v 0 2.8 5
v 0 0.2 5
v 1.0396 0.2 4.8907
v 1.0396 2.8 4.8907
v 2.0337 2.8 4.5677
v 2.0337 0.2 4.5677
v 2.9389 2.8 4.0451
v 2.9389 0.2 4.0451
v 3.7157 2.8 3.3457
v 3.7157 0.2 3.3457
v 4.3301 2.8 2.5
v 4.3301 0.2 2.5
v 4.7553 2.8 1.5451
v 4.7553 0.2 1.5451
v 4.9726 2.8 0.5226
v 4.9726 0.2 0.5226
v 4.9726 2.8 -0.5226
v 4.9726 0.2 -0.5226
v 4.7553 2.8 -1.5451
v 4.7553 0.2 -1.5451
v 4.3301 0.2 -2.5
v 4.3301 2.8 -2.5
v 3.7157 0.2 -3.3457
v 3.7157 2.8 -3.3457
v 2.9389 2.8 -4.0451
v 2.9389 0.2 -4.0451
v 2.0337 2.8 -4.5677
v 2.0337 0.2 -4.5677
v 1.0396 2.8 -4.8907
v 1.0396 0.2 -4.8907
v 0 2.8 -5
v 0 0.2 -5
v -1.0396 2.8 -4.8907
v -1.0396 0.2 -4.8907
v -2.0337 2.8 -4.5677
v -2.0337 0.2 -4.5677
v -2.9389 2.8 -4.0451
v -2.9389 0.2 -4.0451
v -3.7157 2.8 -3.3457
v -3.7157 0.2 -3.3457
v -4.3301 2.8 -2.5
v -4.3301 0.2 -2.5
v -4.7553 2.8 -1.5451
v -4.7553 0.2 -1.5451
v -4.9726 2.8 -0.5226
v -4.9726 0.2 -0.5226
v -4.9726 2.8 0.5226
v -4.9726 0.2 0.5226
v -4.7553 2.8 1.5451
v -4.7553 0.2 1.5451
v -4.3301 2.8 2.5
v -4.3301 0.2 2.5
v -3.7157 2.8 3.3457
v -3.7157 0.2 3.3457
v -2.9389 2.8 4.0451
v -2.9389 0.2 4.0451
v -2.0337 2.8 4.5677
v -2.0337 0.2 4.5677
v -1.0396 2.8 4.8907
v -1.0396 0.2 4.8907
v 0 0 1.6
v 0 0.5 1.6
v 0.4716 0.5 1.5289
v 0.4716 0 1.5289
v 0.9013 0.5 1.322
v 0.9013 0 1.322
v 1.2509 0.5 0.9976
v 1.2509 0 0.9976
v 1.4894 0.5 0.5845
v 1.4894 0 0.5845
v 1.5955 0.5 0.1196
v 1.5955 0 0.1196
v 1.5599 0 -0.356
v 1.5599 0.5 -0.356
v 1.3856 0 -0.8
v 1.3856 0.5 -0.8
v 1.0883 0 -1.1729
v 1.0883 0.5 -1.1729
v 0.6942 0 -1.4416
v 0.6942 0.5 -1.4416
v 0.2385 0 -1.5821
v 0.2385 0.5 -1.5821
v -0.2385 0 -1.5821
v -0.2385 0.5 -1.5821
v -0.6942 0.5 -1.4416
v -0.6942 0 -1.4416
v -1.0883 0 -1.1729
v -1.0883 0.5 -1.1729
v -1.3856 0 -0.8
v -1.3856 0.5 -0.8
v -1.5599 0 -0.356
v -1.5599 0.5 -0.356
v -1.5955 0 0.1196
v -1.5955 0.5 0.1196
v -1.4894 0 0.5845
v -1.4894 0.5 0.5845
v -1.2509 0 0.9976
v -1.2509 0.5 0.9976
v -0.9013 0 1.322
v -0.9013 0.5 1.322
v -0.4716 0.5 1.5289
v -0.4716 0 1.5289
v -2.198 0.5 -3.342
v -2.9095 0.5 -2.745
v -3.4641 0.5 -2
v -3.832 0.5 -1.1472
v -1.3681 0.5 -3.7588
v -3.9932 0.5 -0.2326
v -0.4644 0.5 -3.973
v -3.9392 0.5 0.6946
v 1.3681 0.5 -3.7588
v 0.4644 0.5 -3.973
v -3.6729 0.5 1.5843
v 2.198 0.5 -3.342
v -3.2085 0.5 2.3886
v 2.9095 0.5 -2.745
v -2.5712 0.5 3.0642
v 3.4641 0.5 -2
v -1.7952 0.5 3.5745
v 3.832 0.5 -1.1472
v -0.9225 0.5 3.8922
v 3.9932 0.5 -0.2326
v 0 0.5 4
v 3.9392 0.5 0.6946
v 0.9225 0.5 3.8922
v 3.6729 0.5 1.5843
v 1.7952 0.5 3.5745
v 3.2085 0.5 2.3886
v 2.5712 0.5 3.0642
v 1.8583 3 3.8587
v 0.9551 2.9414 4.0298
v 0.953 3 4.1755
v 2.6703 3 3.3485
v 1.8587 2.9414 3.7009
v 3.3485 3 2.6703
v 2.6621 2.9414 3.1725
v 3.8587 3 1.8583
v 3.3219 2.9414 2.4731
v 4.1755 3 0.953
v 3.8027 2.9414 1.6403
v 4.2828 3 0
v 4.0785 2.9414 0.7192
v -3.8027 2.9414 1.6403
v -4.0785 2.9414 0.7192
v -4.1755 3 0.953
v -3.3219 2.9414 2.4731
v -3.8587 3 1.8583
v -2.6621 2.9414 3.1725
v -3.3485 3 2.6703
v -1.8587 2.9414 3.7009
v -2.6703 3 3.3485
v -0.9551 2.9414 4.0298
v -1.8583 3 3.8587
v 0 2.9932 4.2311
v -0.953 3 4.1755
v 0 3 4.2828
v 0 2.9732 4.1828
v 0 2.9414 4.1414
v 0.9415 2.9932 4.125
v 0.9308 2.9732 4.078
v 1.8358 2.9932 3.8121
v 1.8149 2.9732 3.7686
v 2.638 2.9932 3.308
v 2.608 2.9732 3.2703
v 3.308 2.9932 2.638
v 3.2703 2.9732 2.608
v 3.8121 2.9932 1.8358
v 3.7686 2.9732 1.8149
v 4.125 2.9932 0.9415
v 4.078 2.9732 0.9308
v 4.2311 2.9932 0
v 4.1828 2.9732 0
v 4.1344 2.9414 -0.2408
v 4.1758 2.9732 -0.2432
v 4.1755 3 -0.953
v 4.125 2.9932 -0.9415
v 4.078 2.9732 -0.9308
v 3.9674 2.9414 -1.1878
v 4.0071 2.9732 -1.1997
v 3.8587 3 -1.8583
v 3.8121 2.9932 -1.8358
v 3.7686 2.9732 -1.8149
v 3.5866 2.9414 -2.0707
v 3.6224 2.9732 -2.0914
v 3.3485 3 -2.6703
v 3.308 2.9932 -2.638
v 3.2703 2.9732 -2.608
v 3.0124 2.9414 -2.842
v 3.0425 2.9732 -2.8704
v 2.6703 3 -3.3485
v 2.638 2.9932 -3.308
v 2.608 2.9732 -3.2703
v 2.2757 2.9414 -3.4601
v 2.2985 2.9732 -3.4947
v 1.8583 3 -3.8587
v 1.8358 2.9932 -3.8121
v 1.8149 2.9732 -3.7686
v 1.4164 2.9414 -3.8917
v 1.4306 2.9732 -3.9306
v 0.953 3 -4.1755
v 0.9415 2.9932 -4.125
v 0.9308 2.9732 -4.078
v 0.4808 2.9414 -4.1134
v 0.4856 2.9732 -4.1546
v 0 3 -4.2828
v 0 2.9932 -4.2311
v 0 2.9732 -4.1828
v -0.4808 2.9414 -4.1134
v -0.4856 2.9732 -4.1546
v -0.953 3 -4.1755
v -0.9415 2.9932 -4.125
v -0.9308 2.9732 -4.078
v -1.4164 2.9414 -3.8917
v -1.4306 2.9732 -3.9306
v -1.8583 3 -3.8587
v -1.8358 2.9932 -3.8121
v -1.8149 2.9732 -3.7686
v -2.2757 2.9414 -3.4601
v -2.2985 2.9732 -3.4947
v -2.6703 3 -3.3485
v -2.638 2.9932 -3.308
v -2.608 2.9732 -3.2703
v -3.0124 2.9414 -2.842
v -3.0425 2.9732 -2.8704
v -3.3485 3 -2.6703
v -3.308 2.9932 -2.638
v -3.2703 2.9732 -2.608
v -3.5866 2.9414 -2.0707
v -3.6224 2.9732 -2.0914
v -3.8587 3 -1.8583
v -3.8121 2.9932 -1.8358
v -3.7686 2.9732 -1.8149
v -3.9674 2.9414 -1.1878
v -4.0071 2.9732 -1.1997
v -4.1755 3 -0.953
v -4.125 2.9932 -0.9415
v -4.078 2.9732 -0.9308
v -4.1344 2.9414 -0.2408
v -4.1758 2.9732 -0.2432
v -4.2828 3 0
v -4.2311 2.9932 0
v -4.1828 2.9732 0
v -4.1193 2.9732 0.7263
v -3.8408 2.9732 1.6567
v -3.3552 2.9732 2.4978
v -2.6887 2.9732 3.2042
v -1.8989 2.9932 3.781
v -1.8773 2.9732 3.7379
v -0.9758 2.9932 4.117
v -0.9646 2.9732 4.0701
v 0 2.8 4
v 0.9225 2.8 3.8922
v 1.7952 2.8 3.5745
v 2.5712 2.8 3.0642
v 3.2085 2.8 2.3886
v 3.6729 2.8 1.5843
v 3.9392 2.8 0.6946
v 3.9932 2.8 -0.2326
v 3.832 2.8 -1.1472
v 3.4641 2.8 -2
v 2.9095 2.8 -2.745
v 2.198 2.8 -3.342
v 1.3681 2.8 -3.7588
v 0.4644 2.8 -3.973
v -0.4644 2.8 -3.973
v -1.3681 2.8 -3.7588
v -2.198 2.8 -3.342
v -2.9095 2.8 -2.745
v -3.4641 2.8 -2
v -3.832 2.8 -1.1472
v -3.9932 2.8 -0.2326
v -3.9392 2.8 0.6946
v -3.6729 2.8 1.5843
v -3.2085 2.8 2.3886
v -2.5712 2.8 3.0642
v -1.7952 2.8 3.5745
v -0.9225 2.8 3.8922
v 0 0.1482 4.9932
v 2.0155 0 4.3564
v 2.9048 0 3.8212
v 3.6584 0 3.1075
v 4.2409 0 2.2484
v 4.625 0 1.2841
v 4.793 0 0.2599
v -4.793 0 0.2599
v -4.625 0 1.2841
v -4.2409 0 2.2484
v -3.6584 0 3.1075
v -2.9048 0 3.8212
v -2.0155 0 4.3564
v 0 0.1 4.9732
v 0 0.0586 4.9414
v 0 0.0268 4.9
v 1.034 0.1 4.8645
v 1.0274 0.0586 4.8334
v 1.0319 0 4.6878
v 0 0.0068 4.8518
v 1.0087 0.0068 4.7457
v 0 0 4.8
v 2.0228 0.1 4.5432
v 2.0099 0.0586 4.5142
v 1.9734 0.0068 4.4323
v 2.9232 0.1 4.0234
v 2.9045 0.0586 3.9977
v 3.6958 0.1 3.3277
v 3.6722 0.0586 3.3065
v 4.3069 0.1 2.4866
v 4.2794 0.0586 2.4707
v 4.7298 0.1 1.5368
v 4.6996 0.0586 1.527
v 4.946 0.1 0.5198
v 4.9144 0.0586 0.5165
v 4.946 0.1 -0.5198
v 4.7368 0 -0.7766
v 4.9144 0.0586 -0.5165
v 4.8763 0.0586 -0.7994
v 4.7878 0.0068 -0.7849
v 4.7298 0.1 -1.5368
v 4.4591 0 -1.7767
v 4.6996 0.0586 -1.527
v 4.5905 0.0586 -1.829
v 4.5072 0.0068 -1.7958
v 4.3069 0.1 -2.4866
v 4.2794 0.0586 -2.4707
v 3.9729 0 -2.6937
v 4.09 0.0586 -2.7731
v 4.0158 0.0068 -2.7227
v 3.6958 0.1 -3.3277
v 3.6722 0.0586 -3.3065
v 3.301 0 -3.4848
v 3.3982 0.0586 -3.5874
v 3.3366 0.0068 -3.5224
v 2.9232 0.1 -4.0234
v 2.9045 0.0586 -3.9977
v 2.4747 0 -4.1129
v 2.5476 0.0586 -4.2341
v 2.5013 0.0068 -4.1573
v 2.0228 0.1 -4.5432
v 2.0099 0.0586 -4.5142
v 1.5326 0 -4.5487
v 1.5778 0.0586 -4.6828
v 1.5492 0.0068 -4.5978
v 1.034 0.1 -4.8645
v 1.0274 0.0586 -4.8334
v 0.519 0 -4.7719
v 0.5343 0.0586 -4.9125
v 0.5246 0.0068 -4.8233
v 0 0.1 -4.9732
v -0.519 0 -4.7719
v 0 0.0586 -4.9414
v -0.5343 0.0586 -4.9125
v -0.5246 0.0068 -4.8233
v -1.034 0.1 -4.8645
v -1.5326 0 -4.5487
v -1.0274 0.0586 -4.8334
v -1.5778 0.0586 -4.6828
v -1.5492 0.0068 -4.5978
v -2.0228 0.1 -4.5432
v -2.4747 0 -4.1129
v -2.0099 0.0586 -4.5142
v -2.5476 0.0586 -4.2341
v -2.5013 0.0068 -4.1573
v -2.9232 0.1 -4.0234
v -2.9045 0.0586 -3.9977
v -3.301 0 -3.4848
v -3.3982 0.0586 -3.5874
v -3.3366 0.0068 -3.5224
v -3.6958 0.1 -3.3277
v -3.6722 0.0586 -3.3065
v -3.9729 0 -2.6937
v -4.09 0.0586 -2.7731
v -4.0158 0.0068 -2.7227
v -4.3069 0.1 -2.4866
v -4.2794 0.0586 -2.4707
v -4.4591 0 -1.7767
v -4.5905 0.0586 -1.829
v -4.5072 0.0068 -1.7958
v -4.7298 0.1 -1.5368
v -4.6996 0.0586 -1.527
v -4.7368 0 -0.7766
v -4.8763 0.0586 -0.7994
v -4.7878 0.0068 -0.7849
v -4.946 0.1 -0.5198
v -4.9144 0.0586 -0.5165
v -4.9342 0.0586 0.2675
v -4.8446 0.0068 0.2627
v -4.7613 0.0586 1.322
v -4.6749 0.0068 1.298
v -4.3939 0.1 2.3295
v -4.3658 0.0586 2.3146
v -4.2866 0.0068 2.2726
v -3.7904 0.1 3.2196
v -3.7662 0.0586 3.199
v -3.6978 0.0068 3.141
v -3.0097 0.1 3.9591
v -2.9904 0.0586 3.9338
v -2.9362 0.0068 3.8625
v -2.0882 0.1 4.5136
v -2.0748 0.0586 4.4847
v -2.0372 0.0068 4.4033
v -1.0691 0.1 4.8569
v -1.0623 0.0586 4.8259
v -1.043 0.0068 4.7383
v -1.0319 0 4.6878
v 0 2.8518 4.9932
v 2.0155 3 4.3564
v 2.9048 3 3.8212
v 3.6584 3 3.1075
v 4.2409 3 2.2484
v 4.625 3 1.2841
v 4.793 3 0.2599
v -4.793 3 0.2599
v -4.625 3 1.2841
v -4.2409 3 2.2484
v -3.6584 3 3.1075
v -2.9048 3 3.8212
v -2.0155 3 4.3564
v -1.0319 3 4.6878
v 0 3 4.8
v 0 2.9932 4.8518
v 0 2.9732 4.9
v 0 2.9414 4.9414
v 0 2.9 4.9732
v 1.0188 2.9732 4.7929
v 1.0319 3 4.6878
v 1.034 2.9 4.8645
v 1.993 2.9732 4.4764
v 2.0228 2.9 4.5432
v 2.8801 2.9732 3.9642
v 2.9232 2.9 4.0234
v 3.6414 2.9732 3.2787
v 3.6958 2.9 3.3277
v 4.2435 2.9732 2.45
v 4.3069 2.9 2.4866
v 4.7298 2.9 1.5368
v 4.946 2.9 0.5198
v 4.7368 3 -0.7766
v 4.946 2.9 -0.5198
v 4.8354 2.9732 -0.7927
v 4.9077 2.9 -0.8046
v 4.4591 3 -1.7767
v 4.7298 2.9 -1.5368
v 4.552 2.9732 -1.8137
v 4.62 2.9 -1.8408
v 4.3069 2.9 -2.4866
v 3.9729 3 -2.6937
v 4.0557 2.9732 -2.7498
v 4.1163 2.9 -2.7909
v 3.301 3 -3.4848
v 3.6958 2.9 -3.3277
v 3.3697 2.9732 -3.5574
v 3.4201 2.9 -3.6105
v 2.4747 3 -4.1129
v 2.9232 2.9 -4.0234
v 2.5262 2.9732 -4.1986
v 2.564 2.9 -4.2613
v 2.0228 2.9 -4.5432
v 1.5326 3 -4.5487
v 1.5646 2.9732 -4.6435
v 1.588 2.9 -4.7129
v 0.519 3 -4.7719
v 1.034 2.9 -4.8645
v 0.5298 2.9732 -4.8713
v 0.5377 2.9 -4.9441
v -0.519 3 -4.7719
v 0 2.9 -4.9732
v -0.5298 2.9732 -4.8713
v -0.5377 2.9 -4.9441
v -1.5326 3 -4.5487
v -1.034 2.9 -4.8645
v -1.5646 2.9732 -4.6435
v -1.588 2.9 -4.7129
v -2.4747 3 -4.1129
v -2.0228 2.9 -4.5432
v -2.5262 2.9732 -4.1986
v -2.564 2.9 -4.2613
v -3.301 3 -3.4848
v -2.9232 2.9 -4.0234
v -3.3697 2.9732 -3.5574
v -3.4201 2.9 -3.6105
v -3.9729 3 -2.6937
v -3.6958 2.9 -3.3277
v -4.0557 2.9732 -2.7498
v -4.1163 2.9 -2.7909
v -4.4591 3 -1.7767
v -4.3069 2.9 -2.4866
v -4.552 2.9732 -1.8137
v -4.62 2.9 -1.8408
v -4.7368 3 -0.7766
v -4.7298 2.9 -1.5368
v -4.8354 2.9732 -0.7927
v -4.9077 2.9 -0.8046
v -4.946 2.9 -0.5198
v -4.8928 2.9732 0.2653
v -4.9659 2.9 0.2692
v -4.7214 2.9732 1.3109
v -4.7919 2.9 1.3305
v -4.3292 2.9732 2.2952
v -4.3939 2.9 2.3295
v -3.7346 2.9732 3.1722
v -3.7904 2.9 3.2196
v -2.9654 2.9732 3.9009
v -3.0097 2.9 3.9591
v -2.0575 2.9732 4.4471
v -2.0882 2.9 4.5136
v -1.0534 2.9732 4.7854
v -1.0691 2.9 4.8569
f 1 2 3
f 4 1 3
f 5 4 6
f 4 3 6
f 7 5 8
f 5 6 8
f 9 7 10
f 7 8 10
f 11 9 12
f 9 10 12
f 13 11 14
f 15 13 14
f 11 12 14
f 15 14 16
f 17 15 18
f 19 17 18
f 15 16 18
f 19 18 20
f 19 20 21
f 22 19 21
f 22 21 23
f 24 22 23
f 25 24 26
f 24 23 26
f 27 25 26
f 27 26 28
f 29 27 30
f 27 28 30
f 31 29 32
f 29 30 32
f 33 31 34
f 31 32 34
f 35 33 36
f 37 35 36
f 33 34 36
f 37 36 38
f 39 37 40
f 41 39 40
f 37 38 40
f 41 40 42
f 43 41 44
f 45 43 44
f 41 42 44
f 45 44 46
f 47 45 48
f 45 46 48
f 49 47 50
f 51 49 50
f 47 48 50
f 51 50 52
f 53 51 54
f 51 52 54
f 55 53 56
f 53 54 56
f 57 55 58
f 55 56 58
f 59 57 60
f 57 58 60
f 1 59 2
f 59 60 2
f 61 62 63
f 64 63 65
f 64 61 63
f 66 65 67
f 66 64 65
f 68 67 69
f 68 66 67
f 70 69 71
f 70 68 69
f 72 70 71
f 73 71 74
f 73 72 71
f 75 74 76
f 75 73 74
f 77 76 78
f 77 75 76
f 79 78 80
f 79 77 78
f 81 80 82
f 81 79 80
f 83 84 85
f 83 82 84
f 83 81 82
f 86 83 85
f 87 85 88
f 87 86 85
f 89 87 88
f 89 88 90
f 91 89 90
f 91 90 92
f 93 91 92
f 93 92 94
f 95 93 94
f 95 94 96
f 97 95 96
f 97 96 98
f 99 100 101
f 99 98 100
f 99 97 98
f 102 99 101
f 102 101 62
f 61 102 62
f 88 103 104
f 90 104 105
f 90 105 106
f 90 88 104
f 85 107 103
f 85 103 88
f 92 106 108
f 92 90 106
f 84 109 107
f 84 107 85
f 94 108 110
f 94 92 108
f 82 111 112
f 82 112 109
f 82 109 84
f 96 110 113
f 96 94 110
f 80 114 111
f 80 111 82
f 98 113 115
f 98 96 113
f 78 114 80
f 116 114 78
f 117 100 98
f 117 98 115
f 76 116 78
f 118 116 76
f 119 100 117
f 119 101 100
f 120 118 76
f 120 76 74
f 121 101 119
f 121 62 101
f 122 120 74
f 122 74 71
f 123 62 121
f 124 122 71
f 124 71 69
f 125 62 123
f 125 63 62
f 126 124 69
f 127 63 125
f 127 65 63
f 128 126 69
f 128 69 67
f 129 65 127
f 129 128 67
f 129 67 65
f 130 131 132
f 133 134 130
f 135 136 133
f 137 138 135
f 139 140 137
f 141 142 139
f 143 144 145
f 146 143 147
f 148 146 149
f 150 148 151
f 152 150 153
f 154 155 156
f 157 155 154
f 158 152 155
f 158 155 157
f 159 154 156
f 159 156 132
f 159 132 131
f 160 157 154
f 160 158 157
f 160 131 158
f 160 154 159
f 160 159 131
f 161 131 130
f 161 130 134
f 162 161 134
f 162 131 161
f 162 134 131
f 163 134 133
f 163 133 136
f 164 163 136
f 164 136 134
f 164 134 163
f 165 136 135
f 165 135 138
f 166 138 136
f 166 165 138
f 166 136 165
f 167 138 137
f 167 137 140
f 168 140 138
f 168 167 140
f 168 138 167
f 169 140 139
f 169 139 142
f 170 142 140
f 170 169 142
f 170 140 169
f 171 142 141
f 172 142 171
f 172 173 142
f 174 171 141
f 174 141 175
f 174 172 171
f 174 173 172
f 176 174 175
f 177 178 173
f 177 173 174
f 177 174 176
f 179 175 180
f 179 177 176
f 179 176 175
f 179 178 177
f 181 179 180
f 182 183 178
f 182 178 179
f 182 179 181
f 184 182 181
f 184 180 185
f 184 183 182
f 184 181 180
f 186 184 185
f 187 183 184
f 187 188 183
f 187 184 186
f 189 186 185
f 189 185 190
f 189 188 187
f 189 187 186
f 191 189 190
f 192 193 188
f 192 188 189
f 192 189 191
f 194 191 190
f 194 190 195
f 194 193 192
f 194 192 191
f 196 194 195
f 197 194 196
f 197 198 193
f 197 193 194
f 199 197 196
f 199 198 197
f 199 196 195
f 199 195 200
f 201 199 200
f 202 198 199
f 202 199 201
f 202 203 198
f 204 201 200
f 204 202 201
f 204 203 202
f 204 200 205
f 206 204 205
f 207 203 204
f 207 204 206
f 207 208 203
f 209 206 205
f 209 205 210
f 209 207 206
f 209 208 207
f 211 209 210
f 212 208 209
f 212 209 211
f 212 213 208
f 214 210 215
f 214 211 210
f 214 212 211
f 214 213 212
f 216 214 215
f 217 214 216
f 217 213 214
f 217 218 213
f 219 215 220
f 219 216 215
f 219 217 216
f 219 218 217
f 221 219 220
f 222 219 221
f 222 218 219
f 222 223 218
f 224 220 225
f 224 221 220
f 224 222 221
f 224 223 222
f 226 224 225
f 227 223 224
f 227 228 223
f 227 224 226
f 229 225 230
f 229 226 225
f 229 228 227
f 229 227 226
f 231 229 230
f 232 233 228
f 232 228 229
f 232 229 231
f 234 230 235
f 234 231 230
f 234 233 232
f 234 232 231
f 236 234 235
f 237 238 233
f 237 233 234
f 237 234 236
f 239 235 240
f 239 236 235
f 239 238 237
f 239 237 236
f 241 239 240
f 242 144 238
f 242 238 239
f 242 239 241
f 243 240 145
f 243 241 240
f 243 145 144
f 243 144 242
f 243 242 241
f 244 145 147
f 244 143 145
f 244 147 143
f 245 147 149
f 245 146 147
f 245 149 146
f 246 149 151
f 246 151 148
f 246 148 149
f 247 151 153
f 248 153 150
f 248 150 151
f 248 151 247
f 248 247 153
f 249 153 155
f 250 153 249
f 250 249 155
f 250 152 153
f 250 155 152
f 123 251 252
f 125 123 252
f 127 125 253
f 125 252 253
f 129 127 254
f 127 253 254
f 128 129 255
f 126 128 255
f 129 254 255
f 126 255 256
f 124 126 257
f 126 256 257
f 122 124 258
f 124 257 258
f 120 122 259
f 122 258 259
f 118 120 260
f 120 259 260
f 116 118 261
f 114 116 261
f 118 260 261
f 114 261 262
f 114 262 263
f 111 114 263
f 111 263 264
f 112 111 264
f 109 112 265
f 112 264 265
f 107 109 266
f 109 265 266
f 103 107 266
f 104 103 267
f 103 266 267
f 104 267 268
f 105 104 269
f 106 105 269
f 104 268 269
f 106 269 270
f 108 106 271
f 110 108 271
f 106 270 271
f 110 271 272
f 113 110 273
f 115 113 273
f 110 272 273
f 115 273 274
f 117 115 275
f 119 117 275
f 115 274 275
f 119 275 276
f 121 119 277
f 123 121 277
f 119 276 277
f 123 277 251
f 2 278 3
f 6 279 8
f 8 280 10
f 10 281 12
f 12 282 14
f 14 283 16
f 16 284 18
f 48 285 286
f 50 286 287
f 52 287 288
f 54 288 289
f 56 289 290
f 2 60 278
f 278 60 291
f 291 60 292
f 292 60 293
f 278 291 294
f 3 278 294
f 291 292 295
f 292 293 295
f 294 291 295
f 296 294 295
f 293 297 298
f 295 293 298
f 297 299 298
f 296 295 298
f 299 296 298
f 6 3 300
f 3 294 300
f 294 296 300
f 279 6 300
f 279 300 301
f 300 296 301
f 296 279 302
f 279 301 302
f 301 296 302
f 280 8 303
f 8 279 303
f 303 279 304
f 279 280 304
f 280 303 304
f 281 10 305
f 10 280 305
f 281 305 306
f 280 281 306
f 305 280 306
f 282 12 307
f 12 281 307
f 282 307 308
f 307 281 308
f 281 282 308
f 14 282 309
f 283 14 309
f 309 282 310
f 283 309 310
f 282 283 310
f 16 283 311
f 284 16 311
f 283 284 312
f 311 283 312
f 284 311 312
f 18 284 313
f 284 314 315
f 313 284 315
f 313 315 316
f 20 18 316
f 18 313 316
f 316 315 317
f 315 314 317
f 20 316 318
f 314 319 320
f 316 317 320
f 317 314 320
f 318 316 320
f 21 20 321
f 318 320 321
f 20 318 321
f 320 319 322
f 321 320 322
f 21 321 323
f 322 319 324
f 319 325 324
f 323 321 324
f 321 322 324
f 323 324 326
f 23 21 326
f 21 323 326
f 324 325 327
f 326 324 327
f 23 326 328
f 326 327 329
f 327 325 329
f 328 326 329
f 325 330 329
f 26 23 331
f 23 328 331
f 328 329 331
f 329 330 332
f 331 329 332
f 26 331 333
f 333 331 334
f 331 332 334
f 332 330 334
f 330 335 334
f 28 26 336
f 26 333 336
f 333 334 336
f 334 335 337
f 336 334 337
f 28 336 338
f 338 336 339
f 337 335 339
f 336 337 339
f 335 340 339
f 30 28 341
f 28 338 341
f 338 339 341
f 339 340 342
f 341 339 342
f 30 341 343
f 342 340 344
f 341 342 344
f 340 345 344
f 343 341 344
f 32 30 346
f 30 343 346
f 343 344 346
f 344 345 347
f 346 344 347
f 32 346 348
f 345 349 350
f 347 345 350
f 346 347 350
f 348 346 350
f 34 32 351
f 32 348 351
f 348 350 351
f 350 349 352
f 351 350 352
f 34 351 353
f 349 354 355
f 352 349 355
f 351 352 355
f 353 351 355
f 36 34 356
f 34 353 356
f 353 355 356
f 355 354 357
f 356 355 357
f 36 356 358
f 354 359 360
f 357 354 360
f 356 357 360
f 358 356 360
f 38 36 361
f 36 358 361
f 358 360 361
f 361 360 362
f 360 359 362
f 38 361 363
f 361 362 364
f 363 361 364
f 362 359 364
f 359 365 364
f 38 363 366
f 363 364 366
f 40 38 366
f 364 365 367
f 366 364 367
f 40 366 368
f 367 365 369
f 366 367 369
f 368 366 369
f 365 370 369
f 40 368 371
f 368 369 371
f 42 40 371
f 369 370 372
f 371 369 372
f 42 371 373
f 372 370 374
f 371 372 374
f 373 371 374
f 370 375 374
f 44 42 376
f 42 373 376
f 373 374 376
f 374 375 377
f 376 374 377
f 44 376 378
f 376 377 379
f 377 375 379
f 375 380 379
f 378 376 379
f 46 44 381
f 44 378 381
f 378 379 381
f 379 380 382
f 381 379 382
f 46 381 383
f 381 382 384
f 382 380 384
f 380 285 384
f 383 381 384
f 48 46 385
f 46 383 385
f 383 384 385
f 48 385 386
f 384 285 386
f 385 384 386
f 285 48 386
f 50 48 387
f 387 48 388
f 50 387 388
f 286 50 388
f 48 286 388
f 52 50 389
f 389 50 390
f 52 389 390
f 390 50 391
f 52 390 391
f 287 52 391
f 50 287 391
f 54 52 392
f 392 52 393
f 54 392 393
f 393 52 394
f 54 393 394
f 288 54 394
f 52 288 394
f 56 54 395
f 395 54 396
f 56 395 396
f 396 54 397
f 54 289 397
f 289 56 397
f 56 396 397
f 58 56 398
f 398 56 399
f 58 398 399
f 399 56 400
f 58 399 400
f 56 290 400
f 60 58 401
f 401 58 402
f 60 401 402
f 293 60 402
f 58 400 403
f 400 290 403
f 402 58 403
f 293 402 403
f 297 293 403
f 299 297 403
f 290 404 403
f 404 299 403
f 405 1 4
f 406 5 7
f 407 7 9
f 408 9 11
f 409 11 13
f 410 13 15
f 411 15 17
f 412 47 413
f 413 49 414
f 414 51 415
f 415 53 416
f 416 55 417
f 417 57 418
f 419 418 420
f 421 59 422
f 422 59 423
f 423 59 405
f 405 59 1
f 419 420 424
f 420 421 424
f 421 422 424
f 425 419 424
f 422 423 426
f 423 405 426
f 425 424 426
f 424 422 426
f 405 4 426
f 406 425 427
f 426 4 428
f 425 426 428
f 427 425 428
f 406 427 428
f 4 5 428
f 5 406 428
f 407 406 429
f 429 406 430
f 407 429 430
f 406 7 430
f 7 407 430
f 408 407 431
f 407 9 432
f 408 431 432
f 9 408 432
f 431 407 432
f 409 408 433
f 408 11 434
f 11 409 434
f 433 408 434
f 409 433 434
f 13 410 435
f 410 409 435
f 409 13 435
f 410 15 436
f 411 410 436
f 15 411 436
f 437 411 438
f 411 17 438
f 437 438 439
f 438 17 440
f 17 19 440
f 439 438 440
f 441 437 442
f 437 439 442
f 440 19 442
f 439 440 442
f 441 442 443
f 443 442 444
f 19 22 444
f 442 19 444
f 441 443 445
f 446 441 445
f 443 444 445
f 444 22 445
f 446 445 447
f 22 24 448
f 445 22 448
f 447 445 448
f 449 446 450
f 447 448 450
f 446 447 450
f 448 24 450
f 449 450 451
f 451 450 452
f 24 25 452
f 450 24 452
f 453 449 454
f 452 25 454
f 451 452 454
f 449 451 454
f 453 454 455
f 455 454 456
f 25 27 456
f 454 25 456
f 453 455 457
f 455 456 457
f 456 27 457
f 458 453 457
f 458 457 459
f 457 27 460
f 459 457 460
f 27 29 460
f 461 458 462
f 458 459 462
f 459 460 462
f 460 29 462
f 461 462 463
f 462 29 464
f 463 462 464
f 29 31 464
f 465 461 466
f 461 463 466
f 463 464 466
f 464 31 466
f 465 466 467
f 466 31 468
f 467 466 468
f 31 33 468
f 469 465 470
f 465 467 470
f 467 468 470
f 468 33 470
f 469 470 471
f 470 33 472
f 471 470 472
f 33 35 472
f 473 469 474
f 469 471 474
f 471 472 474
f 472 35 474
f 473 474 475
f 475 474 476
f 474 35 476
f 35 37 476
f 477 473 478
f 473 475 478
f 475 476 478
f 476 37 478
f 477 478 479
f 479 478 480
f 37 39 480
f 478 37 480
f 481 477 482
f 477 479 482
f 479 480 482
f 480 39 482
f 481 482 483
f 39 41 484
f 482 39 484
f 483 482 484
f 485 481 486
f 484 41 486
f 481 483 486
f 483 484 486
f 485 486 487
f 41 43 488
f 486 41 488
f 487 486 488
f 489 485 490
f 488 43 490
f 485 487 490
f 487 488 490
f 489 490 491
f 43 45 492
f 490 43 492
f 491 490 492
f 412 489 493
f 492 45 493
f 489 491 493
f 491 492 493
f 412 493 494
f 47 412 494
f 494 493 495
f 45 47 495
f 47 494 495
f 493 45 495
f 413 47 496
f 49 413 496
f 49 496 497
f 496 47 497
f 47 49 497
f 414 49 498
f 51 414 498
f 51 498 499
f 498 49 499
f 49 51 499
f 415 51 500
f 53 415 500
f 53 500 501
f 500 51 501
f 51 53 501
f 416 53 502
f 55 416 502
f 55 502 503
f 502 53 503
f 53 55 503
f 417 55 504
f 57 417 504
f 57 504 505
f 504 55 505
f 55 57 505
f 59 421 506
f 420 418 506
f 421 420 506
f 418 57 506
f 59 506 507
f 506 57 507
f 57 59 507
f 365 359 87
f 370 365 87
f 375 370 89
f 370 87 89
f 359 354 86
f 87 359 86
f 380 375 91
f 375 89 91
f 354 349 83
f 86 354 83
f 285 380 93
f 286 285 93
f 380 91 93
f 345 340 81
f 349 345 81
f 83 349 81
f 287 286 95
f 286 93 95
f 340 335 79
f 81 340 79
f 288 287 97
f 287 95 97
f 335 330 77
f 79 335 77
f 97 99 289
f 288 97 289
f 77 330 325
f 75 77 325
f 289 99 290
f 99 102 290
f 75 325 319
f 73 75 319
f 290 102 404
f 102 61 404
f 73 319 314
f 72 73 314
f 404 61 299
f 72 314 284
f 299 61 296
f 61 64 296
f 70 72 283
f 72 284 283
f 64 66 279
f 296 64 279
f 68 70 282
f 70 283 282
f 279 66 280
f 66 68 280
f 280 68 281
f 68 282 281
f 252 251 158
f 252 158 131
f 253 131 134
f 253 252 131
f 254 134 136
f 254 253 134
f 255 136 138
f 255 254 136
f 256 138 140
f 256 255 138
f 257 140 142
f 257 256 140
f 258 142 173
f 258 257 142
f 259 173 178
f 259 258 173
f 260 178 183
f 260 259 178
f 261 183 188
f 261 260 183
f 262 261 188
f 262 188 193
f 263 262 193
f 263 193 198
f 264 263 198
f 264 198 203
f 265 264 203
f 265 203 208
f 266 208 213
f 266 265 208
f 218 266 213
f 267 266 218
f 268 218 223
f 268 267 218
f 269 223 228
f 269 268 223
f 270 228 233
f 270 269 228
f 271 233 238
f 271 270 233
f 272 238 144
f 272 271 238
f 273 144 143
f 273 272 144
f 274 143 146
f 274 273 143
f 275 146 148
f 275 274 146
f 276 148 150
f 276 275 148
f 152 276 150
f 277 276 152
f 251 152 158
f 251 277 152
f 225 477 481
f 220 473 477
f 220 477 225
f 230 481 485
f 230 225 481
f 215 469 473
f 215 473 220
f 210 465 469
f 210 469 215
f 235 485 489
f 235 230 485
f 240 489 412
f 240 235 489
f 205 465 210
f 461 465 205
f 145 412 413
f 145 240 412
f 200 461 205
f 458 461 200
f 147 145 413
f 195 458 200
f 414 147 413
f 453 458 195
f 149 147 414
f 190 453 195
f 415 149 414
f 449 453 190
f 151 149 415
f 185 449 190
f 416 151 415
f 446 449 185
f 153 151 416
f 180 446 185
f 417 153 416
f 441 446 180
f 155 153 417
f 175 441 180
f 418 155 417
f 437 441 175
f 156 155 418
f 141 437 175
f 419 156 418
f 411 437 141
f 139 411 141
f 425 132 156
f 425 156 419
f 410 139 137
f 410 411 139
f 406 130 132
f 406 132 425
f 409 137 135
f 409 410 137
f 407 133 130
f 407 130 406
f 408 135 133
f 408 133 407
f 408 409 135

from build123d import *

# Parameters (mm, degrees)
SKETCH1_R           = 5
SKETCH1_R_2         = 1.6
BOSS_EXTRUDE1_DEPTH = 3
SKETCH2_R           = 4
CUT_EXTRUDE1_DEPTH  = 2.5
CHAMFER1_SIZE       = 0.2
FILLET2_R           = 0.2


with BuildPart() as part:
    # Sketch1 → Boss-Extrude1 (new body)
    with BuildSketch(Plane(origin=(0, 0, 0), x_dir=(1, 0, 0), z_dir=(0, 1, 0))):
        with Locations(Location((0, 0, 0), (0, 0, 270))):
            Circle(SKETCH1_R)
        with Locations(Location((0, 0, 0), (0, 0, 270))):
            Circle(SKETCH1_R_2, mode=Mode.SUBTRACT)
    extrude(amount=BOSS_EXTRUDE1_DEPTH)

    # Sketch2 → Cut-Extrude1 (cut)
    with BuildSketch(Plane(origin=(0, 3, 0), x_dir=(1, 0, 0), z_dir=(0, 1, 0))):
        with Locations(Location((0, 0, 0), (0, 0, 270))):
            Circle(SKETCH2_R)
    extrude(amount=-CUT_EXTRUDE1_DEPTH, mode=Mode.SUBTRACT)

    # Chamfer1
    chamfer1_edges = [part.edges().sort_by_distance(p)[0] for p in [
        (0, 3, -4),
    ]]
    chamfer(chamfer1_edges, length=CHAMFER1_SIZE)

    # Fillet2
    fillet2_edges = [part.edges().sort_by_distance(p)[0] for p in [
        (0, 3, -4.2),
        (0, 0, -5),
        (0, 3, -5),
    ]]
    fillet(fillet2_edges, radius=FILLET2_R)


solid = part.part
